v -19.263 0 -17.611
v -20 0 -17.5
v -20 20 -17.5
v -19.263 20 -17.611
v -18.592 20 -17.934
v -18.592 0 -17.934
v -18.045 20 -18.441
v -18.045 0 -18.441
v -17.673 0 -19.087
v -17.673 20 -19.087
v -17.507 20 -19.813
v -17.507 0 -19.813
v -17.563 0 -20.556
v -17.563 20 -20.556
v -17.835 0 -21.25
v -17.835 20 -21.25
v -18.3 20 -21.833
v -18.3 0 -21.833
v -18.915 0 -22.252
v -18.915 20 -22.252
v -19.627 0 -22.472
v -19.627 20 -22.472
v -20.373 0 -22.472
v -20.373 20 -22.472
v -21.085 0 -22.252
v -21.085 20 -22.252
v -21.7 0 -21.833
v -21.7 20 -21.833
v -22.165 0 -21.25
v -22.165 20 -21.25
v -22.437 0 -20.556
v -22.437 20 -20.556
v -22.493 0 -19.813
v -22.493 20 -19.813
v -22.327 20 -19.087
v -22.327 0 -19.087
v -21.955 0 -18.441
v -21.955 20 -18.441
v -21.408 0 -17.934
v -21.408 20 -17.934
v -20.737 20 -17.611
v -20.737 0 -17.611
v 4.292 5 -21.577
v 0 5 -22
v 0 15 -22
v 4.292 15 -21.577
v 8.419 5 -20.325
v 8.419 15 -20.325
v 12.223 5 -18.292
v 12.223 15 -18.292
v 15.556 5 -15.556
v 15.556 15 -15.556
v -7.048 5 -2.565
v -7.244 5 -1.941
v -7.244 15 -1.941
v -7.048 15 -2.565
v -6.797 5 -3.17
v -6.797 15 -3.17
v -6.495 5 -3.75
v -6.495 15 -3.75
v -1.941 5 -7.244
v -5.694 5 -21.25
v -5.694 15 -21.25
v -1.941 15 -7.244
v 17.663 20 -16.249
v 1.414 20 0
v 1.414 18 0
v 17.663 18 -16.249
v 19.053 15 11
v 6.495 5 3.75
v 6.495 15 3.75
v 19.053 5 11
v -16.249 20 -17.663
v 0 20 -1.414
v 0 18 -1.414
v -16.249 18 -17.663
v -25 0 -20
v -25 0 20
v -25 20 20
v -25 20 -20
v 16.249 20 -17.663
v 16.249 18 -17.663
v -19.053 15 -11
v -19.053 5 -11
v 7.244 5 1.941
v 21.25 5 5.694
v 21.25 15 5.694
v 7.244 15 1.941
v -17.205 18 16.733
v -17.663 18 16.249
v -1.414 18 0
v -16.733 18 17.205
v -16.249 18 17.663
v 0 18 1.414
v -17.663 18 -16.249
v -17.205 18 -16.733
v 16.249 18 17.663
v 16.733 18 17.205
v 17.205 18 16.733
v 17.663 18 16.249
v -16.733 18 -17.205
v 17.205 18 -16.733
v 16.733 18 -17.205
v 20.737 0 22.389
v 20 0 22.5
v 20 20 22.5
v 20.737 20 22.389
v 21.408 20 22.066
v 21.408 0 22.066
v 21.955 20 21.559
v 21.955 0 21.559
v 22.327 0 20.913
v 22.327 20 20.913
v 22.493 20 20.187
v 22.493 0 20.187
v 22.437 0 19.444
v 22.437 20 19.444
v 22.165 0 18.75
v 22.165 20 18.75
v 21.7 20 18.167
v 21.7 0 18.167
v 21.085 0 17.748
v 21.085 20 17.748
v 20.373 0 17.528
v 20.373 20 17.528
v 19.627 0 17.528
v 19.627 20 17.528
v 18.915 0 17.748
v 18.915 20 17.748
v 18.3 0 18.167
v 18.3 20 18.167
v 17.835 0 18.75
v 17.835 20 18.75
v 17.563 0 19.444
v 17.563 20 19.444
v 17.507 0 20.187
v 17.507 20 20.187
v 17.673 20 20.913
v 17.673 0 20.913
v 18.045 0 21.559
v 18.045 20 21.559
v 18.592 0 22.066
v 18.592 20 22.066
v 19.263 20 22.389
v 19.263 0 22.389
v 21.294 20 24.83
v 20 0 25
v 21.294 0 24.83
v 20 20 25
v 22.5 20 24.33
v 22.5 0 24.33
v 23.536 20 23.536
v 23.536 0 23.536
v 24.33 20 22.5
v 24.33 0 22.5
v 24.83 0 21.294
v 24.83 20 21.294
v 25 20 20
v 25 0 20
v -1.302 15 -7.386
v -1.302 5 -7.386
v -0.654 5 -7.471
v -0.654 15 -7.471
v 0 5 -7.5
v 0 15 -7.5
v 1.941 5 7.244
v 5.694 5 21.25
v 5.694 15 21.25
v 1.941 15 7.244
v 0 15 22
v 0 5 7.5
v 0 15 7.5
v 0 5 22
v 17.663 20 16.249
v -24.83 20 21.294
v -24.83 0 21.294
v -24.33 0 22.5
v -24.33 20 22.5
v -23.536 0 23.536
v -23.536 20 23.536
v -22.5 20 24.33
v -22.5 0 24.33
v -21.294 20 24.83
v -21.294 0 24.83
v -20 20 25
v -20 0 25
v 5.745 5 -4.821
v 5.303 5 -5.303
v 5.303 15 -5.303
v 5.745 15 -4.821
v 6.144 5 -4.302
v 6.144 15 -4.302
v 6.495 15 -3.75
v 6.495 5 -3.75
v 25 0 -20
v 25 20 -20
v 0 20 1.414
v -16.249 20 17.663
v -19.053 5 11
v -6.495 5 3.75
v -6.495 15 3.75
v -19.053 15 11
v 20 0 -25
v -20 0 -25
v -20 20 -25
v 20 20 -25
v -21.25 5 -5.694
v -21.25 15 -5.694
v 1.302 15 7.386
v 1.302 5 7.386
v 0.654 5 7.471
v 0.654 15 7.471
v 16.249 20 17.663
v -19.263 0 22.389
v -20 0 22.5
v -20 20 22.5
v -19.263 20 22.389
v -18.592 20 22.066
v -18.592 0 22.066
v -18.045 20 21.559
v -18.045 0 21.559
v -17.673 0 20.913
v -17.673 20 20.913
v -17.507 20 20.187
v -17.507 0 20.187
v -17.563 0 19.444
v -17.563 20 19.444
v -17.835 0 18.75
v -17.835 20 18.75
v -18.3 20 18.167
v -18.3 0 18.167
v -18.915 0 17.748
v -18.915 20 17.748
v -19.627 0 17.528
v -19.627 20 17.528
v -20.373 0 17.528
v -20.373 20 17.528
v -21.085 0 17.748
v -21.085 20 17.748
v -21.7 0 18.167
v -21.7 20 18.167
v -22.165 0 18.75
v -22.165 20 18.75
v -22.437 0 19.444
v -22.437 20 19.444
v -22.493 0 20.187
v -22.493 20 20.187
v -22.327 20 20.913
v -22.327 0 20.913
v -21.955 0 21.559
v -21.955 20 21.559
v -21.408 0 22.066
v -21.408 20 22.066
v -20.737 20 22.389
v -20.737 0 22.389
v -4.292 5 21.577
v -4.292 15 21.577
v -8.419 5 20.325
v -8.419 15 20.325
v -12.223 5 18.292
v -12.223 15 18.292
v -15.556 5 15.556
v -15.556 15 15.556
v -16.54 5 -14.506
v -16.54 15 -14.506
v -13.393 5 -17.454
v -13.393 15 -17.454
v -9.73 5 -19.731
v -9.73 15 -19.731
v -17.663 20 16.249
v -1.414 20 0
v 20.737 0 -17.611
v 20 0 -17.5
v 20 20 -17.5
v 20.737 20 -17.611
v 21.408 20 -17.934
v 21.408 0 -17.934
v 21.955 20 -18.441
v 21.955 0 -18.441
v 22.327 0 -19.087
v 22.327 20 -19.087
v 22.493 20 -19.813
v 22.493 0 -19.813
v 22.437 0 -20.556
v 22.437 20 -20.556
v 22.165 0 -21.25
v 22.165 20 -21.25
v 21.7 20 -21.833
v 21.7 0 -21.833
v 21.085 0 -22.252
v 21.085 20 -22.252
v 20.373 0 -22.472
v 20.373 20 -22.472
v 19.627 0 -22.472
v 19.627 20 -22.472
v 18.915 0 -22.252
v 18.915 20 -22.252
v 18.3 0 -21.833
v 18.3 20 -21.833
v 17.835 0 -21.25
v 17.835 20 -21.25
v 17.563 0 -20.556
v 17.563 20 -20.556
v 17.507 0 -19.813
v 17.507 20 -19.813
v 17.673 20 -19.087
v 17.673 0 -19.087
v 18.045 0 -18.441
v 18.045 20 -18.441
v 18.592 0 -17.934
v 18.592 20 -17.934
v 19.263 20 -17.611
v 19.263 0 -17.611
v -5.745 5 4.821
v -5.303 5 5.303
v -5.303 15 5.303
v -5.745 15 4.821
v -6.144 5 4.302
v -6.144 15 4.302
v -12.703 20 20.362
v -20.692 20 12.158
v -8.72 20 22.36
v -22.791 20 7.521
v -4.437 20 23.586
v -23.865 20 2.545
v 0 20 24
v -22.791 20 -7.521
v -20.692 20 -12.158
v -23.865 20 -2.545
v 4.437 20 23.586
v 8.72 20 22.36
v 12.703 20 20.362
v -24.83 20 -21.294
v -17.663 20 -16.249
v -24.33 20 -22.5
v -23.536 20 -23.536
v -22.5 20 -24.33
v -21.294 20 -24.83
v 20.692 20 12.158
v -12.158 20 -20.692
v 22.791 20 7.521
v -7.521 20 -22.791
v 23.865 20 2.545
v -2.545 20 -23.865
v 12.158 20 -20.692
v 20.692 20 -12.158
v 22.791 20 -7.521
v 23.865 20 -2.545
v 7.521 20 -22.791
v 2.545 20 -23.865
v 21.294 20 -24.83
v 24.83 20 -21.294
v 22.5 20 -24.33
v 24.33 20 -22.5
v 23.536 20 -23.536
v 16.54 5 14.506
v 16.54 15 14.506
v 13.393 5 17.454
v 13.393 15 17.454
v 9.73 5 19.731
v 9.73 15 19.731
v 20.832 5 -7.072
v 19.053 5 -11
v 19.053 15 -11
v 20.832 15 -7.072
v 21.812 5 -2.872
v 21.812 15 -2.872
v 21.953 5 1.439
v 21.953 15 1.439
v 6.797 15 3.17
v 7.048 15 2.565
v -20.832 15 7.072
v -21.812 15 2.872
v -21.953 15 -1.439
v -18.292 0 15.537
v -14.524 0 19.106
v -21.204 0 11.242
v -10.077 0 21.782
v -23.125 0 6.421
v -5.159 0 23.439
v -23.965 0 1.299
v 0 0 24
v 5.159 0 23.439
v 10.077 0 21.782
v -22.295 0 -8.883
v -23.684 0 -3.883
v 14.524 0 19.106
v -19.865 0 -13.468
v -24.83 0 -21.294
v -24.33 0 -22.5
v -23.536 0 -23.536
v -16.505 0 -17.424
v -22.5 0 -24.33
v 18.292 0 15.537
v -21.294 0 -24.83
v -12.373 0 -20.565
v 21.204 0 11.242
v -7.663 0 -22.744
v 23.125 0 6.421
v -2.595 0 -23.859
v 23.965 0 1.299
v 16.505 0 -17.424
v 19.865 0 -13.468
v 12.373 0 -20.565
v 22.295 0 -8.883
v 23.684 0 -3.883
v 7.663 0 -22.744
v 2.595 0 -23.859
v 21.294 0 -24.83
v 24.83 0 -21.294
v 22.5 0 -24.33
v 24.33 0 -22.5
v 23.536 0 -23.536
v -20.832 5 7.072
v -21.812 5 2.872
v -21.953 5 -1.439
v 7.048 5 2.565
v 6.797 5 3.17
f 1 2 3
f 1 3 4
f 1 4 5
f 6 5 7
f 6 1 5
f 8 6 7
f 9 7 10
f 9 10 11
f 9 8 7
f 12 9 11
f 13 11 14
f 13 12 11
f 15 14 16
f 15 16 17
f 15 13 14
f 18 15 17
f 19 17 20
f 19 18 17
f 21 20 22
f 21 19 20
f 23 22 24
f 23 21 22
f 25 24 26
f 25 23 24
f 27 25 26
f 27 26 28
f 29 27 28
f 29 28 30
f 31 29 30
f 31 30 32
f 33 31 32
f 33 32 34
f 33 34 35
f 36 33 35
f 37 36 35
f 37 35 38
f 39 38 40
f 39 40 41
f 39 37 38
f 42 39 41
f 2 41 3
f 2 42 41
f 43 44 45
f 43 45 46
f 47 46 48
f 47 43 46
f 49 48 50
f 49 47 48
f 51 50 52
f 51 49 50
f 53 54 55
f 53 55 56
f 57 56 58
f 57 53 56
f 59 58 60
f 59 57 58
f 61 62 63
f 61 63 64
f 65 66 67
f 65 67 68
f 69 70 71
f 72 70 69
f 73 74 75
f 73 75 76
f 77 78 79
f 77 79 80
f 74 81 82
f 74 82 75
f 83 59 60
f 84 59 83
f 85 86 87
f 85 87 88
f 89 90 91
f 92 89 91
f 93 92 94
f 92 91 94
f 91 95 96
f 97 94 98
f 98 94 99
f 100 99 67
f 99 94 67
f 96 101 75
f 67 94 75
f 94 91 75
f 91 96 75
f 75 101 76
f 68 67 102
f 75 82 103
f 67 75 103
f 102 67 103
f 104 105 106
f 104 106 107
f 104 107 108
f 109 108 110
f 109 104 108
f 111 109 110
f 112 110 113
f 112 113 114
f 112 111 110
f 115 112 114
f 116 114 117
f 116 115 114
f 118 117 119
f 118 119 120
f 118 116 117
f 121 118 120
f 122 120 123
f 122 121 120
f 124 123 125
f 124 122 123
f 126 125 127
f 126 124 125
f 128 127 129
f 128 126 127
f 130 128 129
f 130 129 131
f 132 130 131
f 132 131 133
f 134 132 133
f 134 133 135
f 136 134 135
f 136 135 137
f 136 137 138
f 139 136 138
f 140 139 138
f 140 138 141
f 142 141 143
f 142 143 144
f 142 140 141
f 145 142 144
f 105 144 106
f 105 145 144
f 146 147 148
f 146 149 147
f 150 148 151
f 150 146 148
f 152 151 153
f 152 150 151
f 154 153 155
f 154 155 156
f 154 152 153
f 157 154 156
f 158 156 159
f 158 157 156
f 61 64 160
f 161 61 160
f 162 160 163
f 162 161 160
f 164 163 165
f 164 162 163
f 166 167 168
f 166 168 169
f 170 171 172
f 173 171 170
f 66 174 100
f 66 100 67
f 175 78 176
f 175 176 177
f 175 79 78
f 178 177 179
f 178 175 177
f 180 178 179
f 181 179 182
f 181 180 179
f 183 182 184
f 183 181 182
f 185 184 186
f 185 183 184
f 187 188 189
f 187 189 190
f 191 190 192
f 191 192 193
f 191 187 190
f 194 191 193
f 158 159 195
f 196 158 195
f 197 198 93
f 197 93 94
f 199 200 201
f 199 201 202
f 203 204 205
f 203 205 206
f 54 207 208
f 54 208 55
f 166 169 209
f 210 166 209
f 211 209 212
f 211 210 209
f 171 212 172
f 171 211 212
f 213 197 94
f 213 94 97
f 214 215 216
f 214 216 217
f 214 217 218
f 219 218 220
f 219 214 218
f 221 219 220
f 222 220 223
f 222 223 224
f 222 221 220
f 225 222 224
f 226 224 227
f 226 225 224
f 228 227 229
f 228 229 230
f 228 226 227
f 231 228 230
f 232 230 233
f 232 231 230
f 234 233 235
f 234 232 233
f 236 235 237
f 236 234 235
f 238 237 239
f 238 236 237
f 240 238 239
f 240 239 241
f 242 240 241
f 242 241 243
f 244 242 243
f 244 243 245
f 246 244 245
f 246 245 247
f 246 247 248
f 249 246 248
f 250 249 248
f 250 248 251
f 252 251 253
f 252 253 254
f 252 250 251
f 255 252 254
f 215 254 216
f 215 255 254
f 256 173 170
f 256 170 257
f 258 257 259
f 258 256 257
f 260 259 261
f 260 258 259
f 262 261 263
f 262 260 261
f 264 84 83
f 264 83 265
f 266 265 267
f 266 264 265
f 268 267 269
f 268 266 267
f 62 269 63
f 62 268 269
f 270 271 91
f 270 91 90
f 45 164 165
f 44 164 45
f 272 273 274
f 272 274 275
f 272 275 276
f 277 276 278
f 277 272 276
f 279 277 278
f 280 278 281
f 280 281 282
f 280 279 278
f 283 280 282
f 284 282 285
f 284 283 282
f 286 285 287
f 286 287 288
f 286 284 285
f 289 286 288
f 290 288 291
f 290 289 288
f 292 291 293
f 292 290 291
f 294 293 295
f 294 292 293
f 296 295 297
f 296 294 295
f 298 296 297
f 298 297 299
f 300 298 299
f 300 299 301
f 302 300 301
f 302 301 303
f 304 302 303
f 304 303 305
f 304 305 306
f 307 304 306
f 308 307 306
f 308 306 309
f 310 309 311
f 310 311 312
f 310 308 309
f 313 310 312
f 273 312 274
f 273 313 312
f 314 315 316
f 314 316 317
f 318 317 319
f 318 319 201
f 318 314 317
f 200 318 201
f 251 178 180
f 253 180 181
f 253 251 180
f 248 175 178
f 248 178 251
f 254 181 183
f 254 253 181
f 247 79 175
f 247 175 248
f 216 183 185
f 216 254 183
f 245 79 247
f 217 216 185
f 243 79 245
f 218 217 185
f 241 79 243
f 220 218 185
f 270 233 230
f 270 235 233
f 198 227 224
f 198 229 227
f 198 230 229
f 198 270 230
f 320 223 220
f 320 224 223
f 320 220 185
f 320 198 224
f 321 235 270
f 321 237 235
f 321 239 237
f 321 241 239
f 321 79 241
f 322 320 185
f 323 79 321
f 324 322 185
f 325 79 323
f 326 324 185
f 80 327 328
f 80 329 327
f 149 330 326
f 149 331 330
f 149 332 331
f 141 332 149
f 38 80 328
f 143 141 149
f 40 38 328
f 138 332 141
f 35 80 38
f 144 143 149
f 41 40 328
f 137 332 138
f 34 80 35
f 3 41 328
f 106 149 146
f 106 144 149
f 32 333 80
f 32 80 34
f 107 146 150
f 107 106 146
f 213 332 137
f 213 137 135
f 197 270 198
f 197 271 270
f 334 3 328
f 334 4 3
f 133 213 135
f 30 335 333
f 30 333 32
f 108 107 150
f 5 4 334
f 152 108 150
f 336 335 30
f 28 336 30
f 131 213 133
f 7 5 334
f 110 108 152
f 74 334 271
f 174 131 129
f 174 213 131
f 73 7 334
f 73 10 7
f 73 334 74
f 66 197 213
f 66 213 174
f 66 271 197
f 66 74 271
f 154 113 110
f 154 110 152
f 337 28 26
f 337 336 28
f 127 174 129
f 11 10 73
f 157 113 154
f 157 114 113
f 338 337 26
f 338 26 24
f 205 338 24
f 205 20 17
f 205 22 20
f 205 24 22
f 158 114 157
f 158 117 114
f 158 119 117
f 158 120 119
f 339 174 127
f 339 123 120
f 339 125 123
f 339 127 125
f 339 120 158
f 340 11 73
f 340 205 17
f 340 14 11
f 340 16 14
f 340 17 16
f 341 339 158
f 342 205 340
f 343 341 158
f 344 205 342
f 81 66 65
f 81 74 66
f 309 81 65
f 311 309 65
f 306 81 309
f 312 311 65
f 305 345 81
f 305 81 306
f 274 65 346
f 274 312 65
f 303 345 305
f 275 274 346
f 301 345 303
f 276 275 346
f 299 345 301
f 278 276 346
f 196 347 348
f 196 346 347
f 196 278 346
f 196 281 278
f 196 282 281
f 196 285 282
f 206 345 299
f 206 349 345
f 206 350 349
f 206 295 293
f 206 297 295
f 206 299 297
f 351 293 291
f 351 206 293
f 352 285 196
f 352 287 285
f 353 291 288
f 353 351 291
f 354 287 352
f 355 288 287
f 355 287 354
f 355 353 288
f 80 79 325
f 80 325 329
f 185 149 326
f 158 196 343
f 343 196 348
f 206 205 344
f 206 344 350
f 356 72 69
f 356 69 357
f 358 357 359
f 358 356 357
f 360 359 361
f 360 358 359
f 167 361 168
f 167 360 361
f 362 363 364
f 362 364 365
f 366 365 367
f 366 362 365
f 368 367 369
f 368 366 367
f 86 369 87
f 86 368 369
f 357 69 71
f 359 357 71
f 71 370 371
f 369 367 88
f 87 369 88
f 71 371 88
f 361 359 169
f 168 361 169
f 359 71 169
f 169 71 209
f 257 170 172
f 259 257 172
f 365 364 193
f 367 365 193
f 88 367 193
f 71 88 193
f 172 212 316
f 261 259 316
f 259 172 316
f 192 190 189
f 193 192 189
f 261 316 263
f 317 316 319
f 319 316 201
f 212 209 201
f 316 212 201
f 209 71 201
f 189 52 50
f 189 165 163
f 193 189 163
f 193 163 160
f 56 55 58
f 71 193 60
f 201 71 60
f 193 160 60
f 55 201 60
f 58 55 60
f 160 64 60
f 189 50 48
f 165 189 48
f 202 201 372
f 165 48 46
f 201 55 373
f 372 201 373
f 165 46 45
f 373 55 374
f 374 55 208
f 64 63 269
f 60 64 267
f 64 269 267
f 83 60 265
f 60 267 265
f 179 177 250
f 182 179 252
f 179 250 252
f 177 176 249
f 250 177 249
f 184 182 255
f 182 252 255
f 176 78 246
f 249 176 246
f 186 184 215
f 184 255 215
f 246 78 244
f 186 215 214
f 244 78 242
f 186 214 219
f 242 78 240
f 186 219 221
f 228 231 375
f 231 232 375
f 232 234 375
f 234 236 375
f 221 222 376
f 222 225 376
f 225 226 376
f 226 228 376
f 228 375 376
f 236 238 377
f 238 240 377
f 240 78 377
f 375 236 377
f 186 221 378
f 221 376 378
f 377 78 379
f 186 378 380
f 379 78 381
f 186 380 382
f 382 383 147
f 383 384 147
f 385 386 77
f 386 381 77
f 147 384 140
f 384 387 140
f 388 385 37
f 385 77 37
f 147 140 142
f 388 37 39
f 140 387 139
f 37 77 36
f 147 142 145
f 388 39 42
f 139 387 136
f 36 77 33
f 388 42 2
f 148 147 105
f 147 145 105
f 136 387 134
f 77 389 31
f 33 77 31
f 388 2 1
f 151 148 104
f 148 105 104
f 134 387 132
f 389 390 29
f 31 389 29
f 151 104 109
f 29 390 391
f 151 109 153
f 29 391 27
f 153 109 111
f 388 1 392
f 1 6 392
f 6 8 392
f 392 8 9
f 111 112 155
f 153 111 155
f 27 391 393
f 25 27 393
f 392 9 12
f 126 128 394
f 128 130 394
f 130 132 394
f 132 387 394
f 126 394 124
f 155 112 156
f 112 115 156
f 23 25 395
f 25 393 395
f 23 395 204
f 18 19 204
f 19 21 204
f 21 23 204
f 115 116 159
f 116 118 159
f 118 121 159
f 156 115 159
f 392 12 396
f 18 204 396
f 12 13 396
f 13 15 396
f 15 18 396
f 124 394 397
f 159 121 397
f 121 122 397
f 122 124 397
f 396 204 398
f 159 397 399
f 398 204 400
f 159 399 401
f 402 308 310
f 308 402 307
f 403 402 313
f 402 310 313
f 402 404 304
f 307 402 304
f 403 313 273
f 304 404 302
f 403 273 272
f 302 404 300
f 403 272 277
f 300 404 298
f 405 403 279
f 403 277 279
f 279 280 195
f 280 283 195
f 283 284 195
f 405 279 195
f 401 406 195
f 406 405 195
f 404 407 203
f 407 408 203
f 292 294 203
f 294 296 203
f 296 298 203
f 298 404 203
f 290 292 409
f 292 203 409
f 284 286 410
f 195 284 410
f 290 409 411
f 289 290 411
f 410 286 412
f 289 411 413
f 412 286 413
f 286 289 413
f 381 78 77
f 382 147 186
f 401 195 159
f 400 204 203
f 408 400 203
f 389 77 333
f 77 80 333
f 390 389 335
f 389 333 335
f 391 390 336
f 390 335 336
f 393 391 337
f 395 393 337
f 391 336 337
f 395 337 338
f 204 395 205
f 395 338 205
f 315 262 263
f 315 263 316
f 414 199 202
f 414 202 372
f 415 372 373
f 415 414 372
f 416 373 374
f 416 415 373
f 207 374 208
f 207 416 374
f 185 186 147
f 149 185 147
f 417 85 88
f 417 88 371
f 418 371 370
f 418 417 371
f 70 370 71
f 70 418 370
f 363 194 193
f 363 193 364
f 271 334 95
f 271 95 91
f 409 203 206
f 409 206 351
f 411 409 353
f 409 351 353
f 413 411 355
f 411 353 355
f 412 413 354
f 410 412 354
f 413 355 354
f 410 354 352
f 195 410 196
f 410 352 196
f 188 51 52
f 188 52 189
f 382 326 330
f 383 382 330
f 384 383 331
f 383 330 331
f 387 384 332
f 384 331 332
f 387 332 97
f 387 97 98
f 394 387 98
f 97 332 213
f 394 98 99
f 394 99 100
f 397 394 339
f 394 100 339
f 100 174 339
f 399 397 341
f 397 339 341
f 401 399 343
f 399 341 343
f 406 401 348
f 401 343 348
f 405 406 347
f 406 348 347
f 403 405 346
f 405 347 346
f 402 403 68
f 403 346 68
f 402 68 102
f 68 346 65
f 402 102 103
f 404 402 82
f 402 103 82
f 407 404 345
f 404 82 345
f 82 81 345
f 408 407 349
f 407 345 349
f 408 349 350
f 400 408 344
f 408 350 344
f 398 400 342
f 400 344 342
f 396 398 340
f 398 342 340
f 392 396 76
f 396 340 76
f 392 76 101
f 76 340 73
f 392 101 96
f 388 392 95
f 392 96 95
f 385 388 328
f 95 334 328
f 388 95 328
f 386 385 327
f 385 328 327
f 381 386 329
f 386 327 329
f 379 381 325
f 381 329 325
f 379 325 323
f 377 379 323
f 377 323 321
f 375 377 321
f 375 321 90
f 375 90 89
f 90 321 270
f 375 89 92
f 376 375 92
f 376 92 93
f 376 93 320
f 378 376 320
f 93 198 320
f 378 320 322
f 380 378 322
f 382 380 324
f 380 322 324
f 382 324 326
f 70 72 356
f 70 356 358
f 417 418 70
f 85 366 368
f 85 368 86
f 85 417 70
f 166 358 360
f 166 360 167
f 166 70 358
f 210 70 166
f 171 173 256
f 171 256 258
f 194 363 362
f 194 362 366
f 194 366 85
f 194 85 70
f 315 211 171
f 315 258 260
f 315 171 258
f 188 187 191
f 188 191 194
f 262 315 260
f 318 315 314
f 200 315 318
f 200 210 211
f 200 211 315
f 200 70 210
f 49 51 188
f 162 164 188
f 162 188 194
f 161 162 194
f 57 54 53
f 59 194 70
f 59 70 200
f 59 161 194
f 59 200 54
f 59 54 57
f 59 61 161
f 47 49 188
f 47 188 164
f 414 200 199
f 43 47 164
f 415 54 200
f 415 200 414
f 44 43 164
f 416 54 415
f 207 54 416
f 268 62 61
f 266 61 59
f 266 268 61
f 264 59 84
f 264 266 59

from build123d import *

# Parameters (mm, degrees)
SKETCH1_W           = 50
SKETCH1_H           = 50
SKETCH1_R           = 2.5
BOSS_EXTRUDE1_DEPTH = 20
SKETCH2_R           = 24
CUT_EXTRUDE1_DEPTH  = 20
BOSS_EXTRUDE2_START = 5
BOSS_EXTRUDE2_DEPTH = 10
BOSS_EXTRUDE3_DEPTH = 2
FILLET1_R           = 5


with BuildPart() as part:
    # Sketch1 → Boss-Extrude1 (new body)
    with BuildSketch(Plane(origin=(0, 0, 0), x_dir=(1, 0, 0), z_dir=(0, 1, 0))):
        Rectangle(SKETCH1_W, SKETCH1_H)
        with Locations(Location((-20, 20, 0), (0, 0, 270))):
            Circle(SKETCH1_R, mode=Mode.SUBTRACT)
        with Locations(Location((20, 20, 0), (0, 0, 270))):
            Circle(SKETCH1_R, mode=Mode.SUBTRACT)
        with Locations(Location((20, -20, 0), (0, 0, 270))):
            Circle(SKETCH1_R, mode=Mode.SUBTRACT)
        with Locations(Location((-20, -20, 0), (0, 0, 270))):
            Circle(SKETCH1_R, mode=Mode.SUBTRACT)
    extrude(amount=BOSS_EXTRUDE1_DEPTH)

    # Sketch2 → Cut-Extrude1 (cut)
    with BuildSketch(Plane(origin=(0, 20, 0), x_dir=(1, 0, 0), z_dir=(0, 1, 0))):
        with Locations(Location((0, 0, 0), (0, 0, 270))):
            Circle(SKETCH2_R)
    extrude(amount=-CUT_EXTRUDE1_DEPTH, mode=Mode.SUBTRACT)

    # Sketch4 → Boss-Extrude3 (add)
    with BuildSketch(Plane(origin=(0, 20, 0), x_dir=(1, 0, 0), z_dir=(0, 1, 0))):
        with BuildLine():
            Line((16.248718177, 17.662931739), (0, 1.414213562))
            Line((0, 1.414213562), (-16.248718177, 17.662931739))
            ThreePointArc((-16.248718177, 17.662931739), (-16.970562748, 16.970562748), (-17.662931739, 16.248718177))
            Line((-17.662931739, 16.248718177), (-1.414213562, 0))
            Line((-1.414213562, 0), (-17.662931739, -16.248718177))
            ThreePointArc((-17.662931739, -16.248718177), (-16.970562748, -16.970562748), (-16.248718177, -17.662931739))
            Line((-16.248718177, -17.662931739), (0, -1.414213562))
            Line((0, -1.414213562), (16.248718177, -17.662931739))
            ThreePointArc((16.248718177, -17.662931739), (16.970562748, -16.970562748), (17.662931739, -16.248718177))
            Line((17.662931739, -16.248718177), (1.414213562, 0))
            Line((1.414213562, 0), (17.662931739, 16.248718177))
            ThreePointArc((17.662931739, 16.248718177), (16.970562748, 16.970562748), (16.248718177, 17.662931739))
        make_face()
    extrude(amount=-BOSS_EXTRUDE3_DEPTH)

    # Fillet1
    fillet1_edges = [part.edges().sort_by_distance(p)[0] for p in [
        (25, 10, 25),
        (-25, 10, 25),
        (-25, 10, -25),
        (25, 10, -25),
    ]]
    fillet(fillet1_edges, radius=FILLET1_R)


with BuildPart() as body_2:
    # Sketch3 → Boss-Extrude2 (new body)
    with BuildSketch(Plane(origin=(0, 0, 0), x_dir=(1, 0, 0), z_dir=(0, 1, 0)).offset(BOSS_EXTRUDE2_START)):
        with BuildLine():
            Line((0, 7.5), (0, 22))
            ThreePointArc((0, 22), (8.419035512, 20.325349715), (15.556349186, 15.556349186))
            Line((15.556349186, 15.556349186), (5.303300859, 5.303300859))
            ThreePointArc((5.303300859, 5.303300859), (5.950150052, 4.565710718), (6.495190528, 3.75))
            Line((6.495190528, 3.75), (19.052558883, 11))
            ThreePointArc((19.052558883, 11), (21.81178695, 2.871576229), (21.250368178, -5.694018992))
            Line((21.250368178, -5.694018992), (7.244443697, -1.941142838))
            ThreePointArc((7.244443697, -1.941142838), (6.929096494, -2.870125743), (6.495190528, -3.75))
            Line((6.495190528, -3.75), (19.052558883, -11))
            ThreePointArc((19.052558883, -11), (13.392751438, -17.453773486), (5.694018992, -21.250368178))
            Line((5.694018992, -21.250368178), (1.941142838, -7.244443697))
            ThreePointArc((1.941142838, -7.244443697), (0.978946442, -7.43583646), (0, -7.5))
            Line((0, -7.5), (0, -22))
            ThreePointArc((0, -22), (-8.419035512, -20.325349715), (-15.556349186, -15.556349186))
            Line((-15.556349186, -15.556349186), (-5.303300859, -5.303300859))
            ThreePointArc((-5.303300859, -5.303300859), (-5.950150052, -4.565710718), (-6.495190528, -3.75))
            Line((-6.495190528, -3.75), (-19.052558883, -11))
            ThreePointArc((-19.052558883, -11), (-21.81178695, -2.871576229), (-21.250368178, 5.694018992))
            Line((-21.250368178, 5.694018992), (-7.244443697, 1.941142838))
            ThreePointArc((-7.244443697, 1.941142838), (-6.929096494, 2.870125743), (-6.495190528, 3.75))
            Line((-6.495190528, 3.75), (-19.052558883, 11))
            ThreePointArc((-19.052558883, 11), (-13.392751438, 17.453773486), (-5.694018992, 21.250368178))
            Line((-5.694018992, 21.250368178), (-1.941142838, 7.244443697))
            ThreePointArc((-1.941142838, 7.244443697), (-0.978946442, 7.43583646), (0, 7.5))
        make_face()
    extrude(amount=BOSS_EXTRUDE2_DEPTH)


solid = Compound([part.part, body_2.part])
